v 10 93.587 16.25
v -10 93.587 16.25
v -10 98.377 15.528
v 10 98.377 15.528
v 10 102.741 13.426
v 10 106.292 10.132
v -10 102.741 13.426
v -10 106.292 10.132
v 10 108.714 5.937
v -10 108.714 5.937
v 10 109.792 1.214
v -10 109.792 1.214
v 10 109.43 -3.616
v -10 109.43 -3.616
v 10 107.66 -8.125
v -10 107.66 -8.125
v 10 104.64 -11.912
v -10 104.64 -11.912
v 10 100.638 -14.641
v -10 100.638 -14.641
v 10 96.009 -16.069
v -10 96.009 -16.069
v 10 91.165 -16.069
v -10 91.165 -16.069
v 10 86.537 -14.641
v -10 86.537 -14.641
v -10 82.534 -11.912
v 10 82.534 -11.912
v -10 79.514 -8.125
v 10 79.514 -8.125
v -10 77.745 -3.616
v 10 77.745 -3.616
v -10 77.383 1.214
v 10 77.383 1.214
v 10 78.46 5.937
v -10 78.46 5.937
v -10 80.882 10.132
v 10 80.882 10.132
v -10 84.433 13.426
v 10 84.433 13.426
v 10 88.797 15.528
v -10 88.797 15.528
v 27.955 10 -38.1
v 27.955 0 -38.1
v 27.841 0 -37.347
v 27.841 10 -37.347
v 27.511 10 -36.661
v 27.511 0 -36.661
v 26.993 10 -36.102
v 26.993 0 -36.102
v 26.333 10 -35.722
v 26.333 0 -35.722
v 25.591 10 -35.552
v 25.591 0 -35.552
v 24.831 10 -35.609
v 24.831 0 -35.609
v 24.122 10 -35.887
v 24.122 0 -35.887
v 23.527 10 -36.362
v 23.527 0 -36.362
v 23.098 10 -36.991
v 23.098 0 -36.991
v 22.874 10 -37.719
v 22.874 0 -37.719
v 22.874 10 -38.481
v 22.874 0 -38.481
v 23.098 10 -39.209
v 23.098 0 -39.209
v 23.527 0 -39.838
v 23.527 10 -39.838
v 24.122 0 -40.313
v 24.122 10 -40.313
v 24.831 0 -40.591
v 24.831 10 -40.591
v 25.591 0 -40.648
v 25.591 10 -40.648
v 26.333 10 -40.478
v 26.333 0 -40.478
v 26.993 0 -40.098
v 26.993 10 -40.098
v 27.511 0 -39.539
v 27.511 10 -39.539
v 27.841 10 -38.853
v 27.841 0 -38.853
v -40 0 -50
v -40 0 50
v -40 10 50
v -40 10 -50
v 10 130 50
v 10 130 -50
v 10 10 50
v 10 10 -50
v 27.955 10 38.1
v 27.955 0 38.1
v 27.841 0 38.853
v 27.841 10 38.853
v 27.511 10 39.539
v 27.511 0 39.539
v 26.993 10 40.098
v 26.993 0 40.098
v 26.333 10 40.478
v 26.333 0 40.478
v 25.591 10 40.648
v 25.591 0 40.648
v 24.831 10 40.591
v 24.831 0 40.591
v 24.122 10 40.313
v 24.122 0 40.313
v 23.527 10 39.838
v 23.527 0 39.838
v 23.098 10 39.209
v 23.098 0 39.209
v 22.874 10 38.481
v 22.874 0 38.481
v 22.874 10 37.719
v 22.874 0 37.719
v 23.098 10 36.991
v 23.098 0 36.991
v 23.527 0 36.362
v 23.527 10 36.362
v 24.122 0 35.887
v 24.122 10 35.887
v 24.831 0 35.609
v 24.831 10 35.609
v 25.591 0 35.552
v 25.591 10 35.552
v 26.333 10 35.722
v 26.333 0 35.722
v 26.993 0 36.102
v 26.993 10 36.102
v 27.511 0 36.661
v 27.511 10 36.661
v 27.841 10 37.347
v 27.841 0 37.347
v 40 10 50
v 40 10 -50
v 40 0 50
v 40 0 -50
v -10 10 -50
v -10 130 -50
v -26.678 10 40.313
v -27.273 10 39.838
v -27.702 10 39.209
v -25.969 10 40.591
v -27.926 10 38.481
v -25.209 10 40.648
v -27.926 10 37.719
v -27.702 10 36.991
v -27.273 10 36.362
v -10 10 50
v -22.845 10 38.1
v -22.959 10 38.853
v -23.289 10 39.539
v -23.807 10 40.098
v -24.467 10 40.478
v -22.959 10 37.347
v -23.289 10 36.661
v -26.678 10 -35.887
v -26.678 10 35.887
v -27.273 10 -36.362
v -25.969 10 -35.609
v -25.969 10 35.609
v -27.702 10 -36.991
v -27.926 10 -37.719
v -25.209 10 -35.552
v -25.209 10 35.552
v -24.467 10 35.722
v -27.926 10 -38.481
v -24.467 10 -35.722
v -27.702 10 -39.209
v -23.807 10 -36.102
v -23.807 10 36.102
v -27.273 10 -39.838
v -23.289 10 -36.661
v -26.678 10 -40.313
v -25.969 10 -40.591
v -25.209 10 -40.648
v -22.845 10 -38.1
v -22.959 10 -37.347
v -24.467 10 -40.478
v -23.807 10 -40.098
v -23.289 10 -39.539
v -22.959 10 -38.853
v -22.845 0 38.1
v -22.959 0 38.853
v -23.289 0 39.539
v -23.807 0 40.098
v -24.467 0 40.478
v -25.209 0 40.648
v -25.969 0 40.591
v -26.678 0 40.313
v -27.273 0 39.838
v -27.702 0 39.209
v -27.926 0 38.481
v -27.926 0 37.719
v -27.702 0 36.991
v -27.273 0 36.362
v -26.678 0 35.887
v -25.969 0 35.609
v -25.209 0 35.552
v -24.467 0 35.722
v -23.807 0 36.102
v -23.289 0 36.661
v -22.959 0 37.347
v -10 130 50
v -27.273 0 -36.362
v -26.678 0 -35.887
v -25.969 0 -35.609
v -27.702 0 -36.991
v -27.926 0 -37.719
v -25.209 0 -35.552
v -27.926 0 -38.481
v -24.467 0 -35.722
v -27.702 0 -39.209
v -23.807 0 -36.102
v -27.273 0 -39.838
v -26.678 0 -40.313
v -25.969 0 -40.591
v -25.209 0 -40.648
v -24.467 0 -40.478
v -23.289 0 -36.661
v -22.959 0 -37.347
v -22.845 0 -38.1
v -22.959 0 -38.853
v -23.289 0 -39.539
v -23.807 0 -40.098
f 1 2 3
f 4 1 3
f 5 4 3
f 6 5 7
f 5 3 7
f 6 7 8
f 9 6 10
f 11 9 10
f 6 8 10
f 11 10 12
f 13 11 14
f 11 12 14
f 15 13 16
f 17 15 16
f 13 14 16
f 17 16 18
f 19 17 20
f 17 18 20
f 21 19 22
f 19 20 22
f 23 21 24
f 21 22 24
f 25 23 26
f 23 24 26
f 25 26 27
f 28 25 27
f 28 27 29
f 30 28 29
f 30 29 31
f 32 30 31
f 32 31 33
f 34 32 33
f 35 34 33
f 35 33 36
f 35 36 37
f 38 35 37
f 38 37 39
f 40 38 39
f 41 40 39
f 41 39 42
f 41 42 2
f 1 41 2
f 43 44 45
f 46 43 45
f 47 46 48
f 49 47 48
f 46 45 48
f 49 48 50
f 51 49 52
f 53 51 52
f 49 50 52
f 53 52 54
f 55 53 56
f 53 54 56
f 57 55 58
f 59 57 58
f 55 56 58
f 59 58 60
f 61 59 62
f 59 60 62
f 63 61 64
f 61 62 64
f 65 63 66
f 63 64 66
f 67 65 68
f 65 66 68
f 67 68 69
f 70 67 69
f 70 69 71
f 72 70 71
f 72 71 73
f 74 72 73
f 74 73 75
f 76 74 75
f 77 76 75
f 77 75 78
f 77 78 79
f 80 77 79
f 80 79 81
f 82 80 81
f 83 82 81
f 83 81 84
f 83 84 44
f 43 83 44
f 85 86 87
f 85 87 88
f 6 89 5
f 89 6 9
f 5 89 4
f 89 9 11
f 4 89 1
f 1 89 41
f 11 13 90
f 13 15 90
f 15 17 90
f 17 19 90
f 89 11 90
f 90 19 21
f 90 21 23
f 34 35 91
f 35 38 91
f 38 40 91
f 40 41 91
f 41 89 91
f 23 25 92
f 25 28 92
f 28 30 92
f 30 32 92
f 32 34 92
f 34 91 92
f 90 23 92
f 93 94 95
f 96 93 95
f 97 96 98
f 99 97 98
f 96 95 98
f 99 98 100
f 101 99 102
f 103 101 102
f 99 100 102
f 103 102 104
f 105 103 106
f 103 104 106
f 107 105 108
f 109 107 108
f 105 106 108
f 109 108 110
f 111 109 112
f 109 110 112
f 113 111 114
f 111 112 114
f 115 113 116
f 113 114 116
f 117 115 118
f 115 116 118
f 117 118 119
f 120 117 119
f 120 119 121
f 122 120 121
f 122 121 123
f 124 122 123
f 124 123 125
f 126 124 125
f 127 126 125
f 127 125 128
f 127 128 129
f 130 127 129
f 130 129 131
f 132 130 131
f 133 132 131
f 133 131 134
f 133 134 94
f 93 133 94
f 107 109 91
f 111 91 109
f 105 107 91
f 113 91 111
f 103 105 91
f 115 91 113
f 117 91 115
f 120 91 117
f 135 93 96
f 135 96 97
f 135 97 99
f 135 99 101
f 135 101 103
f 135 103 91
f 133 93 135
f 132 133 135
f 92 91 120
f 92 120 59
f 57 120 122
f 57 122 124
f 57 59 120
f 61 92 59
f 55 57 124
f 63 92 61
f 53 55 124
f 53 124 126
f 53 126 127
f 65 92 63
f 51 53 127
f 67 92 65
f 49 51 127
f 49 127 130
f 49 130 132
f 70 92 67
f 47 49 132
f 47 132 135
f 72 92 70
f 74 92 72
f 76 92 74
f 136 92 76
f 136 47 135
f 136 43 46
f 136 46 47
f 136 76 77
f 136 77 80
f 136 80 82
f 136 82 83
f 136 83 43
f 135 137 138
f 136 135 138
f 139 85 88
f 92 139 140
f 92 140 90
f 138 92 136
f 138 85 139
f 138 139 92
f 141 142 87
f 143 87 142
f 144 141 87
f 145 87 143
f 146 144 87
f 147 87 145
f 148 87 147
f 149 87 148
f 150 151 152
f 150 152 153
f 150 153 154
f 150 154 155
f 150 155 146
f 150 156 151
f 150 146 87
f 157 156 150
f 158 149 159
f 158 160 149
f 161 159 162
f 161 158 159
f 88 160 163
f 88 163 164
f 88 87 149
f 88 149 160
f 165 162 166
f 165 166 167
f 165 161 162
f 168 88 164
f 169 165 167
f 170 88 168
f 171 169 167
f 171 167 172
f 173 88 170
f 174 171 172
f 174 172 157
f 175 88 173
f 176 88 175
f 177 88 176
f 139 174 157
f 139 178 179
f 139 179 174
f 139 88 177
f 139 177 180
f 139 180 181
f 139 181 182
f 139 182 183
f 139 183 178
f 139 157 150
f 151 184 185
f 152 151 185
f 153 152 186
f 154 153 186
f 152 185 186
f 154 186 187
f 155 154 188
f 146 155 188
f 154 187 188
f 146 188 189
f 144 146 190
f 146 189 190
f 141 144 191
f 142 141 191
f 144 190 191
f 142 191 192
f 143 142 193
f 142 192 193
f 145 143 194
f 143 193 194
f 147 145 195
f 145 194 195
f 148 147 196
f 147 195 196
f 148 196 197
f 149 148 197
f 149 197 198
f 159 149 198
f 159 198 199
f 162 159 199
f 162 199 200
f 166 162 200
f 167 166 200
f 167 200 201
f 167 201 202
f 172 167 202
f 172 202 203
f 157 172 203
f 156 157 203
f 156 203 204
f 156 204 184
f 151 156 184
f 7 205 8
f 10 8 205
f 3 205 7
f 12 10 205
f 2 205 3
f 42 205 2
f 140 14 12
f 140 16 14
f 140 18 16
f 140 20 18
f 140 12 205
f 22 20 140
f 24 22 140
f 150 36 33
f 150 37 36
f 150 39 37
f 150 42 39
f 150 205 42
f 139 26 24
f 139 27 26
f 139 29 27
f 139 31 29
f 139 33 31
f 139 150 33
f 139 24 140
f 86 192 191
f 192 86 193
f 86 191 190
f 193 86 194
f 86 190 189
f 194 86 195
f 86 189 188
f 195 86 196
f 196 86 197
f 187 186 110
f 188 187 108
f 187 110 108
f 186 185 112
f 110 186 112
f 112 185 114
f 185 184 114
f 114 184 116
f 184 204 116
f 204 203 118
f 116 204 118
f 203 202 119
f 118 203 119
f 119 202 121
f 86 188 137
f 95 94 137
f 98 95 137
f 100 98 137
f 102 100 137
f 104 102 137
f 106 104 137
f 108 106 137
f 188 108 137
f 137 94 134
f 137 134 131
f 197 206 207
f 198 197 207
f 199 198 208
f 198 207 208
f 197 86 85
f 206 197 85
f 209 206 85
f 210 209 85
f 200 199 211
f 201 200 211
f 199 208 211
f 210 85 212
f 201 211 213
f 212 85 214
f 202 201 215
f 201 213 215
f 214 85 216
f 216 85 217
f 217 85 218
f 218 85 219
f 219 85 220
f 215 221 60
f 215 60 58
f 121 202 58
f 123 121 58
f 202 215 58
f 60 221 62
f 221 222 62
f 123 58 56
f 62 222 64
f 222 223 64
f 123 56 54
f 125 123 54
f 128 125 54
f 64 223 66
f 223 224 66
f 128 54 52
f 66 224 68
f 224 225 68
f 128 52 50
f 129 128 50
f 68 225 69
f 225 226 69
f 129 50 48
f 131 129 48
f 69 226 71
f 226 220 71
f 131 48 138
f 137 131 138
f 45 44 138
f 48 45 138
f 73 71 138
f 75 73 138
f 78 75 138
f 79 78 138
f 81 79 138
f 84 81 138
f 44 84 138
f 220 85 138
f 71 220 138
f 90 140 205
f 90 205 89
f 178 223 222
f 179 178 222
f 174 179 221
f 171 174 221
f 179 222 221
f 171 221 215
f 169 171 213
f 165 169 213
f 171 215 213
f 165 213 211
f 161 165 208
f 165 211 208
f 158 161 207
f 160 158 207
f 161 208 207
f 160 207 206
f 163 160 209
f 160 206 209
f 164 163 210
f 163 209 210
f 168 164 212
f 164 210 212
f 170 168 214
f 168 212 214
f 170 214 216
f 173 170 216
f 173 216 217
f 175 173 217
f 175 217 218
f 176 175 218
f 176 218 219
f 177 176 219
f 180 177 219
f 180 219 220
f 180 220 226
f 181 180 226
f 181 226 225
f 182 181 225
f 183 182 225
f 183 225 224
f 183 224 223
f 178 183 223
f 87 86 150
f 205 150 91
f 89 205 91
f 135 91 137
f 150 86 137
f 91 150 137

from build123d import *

# Parameters (mm, degrees)
SKETCH2_W           = 80
SKETCH2_H           = 100
BOSS_EXTRUDE1_DEPTH = 10
SKETCH3_W           = 20
SKETCH3_H           = 100
BOSS_EXTRUDE2_DEPTH = 120
SKETCH5_R           = 2.555
CUT_EXTRUDE2_DEPTH  = 55
SKETCH4_R           = 16.25
CUT_EXTRUDE4_DEPTH  = 45


with BuildPart() as part:
    # Sketch2 → Boss-Extrude1 (new body)
    with BuildSketch(Plane(origin=(0, 0, 0), x_dir=(1, 0, 0), z_dir=(0, 1, 0))):
        Rectangle(SKETCH2_W, SKETCH2_H)
    extrude(amount=BOSS_EXTRUDE1_DEPTH)

    # Sketch3 → Boss-Extrude2 (add)
    with BuildSketch(Plane(origin=(0, 10, 0), x_dir=(1, 0, 0), z_dir=(0, 1, 0))):
        Rectangle(SKETCH3_W, SKETCH3_H)
    extrude(amount=BOSS_EXTRUDE2_DEPTH)

    # Sketch5 → Cut-Extrude2 (cut)
    with BuildSketch(Plane.XZ):
        with Locations((-25.4, -38.1)):
            Circle(SKETCH5_R)
        with Locations((25.4, -38.1)):
            Circle(SKETCH5_R)
        with Locations((-25.4, 38.1)):
            Circle(SKETCH5_R)
        with Locations((25.4, 38.1)):
            Circle(SKETCH5_R)
    extrude(amount=-CUT_EXTRUDE2_DEPTH, mode=Mode.SUBTRACT)

    # Sketch4 → Cut-Extrude4 (cut)
    with BuildSketch(Plane.ZY.offset(10)):
        with Locations((0, 93.587135628)):
            Circle(SKETCH4_R)
    extrude(amount=-CUT_EXTRUDE4_DEPTH, mode=Mode.SUBTRACT)


solid = part.part
